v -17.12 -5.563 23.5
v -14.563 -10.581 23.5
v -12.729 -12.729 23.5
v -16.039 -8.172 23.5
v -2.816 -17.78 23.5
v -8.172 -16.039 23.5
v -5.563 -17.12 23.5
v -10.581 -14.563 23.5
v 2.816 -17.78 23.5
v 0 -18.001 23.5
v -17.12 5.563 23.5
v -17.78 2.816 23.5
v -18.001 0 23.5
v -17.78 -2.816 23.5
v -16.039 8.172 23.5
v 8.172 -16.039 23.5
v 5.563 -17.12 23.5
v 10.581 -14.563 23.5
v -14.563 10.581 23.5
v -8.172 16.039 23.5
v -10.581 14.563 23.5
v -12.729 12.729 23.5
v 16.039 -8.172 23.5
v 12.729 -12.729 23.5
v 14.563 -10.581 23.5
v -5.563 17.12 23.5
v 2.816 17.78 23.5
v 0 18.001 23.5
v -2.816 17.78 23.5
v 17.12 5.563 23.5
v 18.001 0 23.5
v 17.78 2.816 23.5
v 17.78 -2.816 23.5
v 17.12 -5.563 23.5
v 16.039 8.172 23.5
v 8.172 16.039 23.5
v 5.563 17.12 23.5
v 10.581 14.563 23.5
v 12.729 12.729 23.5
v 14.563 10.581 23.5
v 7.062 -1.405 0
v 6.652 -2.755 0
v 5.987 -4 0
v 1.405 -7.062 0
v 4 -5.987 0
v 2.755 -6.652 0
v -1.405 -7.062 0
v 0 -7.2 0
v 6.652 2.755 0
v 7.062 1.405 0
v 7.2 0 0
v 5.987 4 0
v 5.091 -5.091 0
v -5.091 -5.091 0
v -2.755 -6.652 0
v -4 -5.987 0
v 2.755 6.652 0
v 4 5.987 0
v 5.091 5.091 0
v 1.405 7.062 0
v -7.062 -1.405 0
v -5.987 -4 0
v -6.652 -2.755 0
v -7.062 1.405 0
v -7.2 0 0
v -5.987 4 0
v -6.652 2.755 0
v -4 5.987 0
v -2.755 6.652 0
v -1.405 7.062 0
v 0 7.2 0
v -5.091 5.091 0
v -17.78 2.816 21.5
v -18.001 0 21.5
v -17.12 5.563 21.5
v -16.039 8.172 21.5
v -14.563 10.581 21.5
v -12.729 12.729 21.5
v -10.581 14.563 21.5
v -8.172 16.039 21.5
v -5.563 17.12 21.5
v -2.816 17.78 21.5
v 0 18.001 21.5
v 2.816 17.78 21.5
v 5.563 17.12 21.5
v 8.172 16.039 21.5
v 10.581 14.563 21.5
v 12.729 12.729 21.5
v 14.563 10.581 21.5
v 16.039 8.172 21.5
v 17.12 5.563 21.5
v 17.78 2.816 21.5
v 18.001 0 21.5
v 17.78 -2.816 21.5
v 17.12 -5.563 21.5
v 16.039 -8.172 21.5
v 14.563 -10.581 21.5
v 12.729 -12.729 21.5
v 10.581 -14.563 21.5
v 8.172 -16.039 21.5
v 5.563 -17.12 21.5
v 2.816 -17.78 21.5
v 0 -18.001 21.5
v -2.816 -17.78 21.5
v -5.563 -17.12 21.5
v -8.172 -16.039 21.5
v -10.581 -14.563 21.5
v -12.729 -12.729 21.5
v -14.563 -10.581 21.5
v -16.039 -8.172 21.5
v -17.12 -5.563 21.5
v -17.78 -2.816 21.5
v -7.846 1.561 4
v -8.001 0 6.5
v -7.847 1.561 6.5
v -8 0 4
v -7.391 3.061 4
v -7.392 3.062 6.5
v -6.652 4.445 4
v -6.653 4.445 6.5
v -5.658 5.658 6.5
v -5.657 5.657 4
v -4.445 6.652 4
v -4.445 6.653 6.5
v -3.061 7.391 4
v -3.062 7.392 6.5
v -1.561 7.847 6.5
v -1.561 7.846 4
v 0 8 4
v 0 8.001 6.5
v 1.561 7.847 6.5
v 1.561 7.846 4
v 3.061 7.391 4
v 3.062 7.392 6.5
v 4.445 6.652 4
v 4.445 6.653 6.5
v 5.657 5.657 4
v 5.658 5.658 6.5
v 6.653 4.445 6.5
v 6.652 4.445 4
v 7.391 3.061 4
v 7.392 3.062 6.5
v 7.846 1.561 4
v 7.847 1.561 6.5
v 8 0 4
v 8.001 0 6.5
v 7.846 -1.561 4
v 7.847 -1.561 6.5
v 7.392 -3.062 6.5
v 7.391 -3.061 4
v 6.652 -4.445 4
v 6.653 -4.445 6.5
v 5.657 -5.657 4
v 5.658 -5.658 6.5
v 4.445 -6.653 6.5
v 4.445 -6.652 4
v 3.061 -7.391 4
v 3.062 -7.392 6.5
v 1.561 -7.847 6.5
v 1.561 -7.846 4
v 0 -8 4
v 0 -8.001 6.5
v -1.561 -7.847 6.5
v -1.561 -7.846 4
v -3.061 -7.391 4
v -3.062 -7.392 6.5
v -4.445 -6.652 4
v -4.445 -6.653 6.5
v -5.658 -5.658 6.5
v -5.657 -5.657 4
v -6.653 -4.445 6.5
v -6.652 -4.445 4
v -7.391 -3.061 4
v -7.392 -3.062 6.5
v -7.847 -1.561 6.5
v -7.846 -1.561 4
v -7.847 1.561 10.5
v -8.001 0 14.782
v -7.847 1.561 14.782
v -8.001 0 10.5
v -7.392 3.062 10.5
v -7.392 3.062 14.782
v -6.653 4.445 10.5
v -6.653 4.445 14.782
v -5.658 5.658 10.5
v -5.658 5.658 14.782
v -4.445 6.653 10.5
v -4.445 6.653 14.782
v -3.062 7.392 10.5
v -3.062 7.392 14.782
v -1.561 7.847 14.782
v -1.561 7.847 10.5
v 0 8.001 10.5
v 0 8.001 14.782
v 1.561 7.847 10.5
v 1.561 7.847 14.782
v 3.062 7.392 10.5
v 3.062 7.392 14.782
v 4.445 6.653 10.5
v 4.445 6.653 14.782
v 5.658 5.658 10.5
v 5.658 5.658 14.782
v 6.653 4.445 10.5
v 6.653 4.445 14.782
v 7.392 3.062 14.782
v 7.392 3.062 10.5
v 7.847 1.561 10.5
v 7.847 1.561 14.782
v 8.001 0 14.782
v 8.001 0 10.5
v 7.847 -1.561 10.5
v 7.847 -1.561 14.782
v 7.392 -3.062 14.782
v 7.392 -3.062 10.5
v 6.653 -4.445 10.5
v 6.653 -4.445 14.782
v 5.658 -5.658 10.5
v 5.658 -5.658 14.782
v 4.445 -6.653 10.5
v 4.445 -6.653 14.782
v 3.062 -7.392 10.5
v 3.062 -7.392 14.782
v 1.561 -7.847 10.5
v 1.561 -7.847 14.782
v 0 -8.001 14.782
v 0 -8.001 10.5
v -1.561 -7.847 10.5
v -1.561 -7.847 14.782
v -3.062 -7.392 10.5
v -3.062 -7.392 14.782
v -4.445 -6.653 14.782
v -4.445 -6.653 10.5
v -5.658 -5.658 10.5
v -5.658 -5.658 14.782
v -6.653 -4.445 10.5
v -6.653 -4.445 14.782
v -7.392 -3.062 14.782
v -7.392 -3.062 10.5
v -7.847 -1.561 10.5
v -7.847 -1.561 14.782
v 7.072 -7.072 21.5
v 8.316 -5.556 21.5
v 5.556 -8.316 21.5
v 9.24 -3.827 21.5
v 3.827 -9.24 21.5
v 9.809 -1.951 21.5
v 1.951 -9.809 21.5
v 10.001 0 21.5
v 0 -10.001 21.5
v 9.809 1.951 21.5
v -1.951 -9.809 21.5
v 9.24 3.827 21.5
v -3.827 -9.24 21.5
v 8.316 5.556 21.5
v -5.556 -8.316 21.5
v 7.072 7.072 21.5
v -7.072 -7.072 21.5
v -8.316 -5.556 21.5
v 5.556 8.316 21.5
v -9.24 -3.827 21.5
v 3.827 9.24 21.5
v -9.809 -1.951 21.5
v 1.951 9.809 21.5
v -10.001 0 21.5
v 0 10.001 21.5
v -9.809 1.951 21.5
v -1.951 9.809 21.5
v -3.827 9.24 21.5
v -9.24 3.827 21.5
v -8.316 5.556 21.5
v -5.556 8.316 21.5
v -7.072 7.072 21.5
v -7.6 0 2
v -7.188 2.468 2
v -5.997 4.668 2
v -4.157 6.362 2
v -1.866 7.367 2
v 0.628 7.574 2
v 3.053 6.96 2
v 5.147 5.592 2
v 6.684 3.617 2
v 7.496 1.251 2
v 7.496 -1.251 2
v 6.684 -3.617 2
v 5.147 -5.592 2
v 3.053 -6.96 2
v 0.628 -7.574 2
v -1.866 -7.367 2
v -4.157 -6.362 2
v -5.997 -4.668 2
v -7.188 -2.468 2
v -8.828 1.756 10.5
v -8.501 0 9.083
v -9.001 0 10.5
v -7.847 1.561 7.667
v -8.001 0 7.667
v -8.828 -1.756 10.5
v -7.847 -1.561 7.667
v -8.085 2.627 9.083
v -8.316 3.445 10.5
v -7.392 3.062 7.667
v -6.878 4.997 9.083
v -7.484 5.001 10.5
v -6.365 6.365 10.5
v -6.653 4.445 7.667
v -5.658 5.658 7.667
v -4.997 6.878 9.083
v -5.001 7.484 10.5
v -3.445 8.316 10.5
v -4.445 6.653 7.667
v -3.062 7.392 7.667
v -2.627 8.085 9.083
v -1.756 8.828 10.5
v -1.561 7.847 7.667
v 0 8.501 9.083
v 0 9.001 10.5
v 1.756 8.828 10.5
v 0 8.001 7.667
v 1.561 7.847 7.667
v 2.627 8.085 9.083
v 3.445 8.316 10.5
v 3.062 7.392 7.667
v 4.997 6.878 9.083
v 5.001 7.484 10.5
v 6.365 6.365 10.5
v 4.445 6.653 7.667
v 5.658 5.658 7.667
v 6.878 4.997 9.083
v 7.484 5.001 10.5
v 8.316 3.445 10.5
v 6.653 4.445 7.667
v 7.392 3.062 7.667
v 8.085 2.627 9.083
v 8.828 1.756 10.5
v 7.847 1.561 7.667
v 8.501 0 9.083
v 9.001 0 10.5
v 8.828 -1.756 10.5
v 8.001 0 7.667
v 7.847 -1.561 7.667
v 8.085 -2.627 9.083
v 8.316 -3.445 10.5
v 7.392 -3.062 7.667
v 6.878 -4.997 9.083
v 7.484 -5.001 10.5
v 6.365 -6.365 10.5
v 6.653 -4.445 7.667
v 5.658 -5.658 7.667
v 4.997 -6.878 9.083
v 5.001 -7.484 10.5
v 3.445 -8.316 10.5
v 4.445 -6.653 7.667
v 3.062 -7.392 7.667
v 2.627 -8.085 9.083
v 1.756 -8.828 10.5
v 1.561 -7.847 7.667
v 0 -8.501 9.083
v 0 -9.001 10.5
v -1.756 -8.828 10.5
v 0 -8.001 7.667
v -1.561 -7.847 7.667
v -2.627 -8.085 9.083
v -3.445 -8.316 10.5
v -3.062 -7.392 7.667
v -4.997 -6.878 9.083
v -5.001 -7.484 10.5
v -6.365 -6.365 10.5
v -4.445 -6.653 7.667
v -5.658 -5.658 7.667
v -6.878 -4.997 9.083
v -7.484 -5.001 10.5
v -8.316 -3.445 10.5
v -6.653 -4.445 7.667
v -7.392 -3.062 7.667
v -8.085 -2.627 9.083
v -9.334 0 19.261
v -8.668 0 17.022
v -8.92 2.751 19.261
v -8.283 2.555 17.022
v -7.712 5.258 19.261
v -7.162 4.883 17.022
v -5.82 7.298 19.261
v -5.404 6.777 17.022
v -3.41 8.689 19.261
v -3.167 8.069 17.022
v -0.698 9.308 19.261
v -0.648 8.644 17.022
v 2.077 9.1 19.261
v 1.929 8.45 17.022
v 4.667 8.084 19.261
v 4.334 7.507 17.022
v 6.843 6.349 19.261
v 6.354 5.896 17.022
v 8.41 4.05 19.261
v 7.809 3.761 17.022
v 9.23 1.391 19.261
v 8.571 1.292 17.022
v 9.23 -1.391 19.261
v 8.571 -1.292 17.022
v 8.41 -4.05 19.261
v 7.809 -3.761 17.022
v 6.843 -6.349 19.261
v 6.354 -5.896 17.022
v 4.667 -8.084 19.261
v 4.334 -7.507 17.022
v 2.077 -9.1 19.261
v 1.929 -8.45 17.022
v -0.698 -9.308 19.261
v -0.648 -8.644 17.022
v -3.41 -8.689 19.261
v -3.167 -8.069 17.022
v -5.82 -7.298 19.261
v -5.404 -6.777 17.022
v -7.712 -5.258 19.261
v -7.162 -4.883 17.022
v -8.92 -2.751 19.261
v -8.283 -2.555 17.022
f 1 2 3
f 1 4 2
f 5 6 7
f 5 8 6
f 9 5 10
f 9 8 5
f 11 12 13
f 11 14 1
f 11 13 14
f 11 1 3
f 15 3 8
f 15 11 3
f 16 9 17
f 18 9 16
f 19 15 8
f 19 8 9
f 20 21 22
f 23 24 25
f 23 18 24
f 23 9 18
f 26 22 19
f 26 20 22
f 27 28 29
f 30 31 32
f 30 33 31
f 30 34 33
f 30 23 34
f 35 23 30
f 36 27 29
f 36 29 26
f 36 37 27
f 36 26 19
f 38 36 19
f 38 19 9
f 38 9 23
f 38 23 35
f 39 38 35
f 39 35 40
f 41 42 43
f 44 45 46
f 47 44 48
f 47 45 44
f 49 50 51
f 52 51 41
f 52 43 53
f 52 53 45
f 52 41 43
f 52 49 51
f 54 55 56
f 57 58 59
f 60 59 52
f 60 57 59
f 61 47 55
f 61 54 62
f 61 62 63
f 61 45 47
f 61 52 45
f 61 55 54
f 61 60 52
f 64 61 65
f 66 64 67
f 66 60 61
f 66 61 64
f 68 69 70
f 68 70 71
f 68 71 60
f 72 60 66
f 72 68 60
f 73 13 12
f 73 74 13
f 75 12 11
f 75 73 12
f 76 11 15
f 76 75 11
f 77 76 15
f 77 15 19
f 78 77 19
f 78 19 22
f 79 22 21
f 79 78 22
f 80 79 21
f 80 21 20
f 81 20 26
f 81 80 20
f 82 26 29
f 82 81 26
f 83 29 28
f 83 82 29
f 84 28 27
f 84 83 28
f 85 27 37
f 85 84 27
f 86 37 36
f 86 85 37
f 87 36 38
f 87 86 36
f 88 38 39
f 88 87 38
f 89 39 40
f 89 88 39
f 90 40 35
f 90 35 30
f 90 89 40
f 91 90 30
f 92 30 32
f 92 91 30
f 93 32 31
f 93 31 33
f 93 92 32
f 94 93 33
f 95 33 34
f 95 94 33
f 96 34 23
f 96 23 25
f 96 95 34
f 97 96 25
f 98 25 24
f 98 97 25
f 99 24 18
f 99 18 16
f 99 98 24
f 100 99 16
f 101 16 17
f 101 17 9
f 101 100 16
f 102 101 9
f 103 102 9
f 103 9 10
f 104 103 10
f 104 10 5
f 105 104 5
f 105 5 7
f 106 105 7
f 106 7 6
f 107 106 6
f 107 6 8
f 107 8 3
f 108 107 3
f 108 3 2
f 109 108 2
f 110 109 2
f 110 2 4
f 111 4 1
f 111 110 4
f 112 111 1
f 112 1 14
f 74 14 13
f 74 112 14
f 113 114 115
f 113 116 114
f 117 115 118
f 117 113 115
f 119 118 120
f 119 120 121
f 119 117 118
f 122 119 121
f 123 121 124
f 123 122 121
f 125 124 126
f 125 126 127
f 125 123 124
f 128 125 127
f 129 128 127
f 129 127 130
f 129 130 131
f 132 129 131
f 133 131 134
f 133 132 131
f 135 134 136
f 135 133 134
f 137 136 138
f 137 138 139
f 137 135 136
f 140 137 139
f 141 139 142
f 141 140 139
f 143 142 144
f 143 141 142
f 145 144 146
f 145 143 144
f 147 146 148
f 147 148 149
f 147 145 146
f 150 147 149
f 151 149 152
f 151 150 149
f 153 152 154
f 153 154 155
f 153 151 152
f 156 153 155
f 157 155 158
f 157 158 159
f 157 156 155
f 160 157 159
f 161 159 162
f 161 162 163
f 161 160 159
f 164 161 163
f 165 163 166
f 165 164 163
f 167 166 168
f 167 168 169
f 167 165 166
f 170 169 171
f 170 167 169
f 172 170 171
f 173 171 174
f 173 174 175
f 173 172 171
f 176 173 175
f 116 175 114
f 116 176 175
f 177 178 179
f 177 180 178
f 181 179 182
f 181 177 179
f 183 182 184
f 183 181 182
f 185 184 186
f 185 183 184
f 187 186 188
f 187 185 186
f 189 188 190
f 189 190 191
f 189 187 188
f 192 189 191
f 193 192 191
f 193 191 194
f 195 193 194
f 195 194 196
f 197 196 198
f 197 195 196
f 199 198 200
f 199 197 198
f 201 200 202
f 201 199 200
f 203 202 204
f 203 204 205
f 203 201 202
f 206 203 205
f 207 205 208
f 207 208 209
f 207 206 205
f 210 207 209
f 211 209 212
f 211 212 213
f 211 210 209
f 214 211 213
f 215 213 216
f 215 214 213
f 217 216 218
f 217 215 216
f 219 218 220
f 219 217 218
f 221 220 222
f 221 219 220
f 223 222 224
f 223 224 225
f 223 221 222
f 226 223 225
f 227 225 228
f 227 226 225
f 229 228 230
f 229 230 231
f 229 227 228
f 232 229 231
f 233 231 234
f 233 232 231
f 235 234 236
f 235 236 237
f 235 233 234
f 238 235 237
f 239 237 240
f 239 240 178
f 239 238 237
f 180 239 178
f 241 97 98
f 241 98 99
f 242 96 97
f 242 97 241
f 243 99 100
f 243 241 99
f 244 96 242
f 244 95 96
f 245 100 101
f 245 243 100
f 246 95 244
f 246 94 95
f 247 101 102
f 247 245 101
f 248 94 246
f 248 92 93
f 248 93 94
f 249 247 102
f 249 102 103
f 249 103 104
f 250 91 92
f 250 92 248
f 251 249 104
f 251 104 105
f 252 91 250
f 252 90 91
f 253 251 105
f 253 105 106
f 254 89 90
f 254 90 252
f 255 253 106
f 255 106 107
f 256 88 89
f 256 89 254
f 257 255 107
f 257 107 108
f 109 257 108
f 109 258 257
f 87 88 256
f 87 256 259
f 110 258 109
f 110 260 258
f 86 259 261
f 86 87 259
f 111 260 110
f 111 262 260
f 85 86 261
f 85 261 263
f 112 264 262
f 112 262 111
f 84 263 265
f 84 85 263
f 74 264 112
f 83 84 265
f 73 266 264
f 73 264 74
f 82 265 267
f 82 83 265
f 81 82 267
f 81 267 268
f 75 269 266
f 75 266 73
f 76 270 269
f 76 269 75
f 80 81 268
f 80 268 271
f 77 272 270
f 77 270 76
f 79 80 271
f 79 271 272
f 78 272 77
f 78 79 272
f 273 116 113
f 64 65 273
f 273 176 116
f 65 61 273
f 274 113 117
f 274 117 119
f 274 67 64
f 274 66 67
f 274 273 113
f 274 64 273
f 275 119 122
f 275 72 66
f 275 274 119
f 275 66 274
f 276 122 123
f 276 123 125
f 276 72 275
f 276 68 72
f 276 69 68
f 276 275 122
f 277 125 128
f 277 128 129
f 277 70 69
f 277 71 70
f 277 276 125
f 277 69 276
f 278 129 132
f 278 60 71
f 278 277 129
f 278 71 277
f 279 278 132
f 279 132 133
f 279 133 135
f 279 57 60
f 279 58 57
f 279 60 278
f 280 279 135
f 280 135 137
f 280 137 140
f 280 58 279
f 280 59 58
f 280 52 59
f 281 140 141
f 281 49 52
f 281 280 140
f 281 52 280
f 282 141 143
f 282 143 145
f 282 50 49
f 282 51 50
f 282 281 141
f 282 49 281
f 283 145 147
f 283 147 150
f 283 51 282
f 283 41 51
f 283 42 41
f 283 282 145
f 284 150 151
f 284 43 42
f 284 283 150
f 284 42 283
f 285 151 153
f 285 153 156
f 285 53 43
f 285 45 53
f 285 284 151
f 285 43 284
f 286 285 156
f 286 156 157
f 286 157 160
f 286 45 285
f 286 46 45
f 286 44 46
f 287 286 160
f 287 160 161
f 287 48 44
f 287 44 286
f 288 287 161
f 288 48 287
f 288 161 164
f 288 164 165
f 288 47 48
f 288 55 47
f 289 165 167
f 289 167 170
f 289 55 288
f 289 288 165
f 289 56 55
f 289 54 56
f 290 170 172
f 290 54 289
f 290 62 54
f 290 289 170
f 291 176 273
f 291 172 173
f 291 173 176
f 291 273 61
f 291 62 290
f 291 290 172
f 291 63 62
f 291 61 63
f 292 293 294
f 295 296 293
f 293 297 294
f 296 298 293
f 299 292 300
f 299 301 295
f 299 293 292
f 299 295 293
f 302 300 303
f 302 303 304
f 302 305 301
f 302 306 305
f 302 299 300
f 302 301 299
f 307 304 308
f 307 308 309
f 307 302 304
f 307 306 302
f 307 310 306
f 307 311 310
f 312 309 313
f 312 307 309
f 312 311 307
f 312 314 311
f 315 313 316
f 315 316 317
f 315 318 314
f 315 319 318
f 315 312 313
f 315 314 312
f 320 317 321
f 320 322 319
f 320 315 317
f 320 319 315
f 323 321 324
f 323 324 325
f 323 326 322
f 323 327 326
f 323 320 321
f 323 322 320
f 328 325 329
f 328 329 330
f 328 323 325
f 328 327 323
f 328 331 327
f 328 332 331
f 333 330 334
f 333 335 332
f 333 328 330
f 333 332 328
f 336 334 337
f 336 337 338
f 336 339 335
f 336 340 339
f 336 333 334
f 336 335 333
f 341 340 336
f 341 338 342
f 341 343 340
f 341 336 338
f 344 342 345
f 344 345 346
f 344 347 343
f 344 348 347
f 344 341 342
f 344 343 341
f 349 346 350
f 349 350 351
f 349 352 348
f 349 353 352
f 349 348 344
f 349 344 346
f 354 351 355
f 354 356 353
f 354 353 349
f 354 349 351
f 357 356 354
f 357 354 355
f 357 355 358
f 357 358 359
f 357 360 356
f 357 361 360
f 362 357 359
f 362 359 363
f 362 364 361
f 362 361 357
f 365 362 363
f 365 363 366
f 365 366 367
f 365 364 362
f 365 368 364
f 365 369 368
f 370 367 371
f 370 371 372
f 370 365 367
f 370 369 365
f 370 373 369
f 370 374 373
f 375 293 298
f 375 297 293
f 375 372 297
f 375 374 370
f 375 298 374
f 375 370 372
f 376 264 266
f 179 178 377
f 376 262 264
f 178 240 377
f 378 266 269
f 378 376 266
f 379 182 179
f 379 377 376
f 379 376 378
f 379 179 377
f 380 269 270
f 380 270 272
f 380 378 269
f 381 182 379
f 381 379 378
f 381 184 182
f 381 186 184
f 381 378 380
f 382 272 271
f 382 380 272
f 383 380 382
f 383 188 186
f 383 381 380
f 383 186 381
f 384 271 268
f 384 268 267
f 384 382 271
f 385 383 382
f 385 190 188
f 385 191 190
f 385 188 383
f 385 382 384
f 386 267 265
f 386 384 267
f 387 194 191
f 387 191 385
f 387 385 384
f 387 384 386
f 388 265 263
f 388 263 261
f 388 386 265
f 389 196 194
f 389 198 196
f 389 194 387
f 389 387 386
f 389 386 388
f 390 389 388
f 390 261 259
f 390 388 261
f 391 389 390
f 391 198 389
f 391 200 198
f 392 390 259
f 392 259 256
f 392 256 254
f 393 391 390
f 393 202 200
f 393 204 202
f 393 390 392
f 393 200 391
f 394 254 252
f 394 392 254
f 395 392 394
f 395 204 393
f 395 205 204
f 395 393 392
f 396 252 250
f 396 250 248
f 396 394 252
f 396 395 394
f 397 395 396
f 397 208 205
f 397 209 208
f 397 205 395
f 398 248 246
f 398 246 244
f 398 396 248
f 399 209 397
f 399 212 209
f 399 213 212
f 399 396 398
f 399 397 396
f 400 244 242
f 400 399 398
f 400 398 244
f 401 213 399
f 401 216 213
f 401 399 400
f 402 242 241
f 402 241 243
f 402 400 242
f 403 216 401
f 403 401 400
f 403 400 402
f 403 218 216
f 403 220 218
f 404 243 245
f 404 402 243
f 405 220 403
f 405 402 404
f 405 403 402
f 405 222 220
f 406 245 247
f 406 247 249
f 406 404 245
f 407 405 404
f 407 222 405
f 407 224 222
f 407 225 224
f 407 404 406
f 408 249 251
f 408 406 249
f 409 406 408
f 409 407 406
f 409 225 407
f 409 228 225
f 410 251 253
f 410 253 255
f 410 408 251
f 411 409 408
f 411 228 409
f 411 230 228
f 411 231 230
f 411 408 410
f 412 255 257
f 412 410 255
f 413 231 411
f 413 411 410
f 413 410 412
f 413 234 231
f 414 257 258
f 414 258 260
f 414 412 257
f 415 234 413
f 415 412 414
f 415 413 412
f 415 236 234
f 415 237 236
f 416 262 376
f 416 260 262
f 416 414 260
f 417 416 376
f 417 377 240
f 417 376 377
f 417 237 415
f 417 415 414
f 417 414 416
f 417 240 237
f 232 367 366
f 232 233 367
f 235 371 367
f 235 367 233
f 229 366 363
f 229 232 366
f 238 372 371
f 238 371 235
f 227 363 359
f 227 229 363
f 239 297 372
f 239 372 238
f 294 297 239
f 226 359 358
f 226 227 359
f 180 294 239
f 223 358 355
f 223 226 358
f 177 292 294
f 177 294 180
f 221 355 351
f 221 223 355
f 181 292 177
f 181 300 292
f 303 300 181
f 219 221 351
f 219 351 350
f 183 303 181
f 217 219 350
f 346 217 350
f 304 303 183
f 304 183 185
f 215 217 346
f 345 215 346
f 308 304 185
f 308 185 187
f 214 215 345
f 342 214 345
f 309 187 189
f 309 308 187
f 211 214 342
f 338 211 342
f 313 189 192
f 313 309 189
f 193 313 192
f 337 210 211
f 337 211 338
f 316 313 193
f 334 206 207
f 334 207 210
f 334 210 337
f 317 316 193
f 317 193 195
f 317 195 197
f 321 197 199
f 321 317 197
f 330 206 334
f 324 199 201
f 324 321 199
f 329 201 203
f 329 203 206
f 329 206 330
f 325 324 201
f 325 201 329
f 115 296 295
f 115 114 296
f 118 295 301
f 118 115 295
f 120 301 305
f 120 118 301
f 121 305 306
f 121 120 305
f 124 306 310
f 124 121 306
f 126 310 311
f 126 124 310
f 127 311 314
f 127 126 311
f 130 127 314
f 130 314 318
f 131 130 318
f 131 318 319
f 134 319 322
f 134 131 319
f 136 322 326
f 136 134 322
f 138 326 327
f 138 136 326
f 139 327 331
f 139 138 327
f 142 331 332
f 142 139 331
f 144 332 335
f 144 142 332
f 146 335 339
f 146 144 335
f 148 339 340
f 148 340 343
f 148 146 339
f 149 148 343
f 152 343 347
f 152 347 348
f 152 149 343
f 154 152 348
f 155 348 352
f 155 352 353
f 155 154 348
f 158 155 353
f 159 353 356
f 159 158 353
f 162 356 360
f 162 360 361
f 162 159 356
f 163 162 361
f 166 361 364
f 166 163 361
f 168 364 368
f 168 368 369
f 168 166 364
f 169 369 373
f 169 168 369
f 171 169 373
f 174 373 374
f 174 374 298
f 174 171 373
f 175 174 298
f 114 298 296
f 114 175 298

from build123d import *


with BuildPart() as f1:
    # F0 (on Front) → F1 (revolve)
    with BuildSketch(Plane.XZ):
        Polygon((-8.001124, 7.66683), (-8.001124, 6.5), (-8, 4), (-7.2, 0), (0, 0), (0, 23.5), (-18.001124, 23.5), (-18.001124, 21.5), (-10.001124, 21.5), (-8.001124, 21.5), (-8.001124, 14.782405), (-8.001124, 10.5), align=None)
        Polygon((-9.001124, 10.5), (-8.001124, 7.66683), (-8.001124, 10.5), align=None)
        Polygon((-10.001124, 21.5), (-8.001124, 14.782405), (-8.001124, 21.5), align=None)
    revolve(axis=Axis((0, 0, 11.75), (0, 0, -1)))


solid = f1.part
